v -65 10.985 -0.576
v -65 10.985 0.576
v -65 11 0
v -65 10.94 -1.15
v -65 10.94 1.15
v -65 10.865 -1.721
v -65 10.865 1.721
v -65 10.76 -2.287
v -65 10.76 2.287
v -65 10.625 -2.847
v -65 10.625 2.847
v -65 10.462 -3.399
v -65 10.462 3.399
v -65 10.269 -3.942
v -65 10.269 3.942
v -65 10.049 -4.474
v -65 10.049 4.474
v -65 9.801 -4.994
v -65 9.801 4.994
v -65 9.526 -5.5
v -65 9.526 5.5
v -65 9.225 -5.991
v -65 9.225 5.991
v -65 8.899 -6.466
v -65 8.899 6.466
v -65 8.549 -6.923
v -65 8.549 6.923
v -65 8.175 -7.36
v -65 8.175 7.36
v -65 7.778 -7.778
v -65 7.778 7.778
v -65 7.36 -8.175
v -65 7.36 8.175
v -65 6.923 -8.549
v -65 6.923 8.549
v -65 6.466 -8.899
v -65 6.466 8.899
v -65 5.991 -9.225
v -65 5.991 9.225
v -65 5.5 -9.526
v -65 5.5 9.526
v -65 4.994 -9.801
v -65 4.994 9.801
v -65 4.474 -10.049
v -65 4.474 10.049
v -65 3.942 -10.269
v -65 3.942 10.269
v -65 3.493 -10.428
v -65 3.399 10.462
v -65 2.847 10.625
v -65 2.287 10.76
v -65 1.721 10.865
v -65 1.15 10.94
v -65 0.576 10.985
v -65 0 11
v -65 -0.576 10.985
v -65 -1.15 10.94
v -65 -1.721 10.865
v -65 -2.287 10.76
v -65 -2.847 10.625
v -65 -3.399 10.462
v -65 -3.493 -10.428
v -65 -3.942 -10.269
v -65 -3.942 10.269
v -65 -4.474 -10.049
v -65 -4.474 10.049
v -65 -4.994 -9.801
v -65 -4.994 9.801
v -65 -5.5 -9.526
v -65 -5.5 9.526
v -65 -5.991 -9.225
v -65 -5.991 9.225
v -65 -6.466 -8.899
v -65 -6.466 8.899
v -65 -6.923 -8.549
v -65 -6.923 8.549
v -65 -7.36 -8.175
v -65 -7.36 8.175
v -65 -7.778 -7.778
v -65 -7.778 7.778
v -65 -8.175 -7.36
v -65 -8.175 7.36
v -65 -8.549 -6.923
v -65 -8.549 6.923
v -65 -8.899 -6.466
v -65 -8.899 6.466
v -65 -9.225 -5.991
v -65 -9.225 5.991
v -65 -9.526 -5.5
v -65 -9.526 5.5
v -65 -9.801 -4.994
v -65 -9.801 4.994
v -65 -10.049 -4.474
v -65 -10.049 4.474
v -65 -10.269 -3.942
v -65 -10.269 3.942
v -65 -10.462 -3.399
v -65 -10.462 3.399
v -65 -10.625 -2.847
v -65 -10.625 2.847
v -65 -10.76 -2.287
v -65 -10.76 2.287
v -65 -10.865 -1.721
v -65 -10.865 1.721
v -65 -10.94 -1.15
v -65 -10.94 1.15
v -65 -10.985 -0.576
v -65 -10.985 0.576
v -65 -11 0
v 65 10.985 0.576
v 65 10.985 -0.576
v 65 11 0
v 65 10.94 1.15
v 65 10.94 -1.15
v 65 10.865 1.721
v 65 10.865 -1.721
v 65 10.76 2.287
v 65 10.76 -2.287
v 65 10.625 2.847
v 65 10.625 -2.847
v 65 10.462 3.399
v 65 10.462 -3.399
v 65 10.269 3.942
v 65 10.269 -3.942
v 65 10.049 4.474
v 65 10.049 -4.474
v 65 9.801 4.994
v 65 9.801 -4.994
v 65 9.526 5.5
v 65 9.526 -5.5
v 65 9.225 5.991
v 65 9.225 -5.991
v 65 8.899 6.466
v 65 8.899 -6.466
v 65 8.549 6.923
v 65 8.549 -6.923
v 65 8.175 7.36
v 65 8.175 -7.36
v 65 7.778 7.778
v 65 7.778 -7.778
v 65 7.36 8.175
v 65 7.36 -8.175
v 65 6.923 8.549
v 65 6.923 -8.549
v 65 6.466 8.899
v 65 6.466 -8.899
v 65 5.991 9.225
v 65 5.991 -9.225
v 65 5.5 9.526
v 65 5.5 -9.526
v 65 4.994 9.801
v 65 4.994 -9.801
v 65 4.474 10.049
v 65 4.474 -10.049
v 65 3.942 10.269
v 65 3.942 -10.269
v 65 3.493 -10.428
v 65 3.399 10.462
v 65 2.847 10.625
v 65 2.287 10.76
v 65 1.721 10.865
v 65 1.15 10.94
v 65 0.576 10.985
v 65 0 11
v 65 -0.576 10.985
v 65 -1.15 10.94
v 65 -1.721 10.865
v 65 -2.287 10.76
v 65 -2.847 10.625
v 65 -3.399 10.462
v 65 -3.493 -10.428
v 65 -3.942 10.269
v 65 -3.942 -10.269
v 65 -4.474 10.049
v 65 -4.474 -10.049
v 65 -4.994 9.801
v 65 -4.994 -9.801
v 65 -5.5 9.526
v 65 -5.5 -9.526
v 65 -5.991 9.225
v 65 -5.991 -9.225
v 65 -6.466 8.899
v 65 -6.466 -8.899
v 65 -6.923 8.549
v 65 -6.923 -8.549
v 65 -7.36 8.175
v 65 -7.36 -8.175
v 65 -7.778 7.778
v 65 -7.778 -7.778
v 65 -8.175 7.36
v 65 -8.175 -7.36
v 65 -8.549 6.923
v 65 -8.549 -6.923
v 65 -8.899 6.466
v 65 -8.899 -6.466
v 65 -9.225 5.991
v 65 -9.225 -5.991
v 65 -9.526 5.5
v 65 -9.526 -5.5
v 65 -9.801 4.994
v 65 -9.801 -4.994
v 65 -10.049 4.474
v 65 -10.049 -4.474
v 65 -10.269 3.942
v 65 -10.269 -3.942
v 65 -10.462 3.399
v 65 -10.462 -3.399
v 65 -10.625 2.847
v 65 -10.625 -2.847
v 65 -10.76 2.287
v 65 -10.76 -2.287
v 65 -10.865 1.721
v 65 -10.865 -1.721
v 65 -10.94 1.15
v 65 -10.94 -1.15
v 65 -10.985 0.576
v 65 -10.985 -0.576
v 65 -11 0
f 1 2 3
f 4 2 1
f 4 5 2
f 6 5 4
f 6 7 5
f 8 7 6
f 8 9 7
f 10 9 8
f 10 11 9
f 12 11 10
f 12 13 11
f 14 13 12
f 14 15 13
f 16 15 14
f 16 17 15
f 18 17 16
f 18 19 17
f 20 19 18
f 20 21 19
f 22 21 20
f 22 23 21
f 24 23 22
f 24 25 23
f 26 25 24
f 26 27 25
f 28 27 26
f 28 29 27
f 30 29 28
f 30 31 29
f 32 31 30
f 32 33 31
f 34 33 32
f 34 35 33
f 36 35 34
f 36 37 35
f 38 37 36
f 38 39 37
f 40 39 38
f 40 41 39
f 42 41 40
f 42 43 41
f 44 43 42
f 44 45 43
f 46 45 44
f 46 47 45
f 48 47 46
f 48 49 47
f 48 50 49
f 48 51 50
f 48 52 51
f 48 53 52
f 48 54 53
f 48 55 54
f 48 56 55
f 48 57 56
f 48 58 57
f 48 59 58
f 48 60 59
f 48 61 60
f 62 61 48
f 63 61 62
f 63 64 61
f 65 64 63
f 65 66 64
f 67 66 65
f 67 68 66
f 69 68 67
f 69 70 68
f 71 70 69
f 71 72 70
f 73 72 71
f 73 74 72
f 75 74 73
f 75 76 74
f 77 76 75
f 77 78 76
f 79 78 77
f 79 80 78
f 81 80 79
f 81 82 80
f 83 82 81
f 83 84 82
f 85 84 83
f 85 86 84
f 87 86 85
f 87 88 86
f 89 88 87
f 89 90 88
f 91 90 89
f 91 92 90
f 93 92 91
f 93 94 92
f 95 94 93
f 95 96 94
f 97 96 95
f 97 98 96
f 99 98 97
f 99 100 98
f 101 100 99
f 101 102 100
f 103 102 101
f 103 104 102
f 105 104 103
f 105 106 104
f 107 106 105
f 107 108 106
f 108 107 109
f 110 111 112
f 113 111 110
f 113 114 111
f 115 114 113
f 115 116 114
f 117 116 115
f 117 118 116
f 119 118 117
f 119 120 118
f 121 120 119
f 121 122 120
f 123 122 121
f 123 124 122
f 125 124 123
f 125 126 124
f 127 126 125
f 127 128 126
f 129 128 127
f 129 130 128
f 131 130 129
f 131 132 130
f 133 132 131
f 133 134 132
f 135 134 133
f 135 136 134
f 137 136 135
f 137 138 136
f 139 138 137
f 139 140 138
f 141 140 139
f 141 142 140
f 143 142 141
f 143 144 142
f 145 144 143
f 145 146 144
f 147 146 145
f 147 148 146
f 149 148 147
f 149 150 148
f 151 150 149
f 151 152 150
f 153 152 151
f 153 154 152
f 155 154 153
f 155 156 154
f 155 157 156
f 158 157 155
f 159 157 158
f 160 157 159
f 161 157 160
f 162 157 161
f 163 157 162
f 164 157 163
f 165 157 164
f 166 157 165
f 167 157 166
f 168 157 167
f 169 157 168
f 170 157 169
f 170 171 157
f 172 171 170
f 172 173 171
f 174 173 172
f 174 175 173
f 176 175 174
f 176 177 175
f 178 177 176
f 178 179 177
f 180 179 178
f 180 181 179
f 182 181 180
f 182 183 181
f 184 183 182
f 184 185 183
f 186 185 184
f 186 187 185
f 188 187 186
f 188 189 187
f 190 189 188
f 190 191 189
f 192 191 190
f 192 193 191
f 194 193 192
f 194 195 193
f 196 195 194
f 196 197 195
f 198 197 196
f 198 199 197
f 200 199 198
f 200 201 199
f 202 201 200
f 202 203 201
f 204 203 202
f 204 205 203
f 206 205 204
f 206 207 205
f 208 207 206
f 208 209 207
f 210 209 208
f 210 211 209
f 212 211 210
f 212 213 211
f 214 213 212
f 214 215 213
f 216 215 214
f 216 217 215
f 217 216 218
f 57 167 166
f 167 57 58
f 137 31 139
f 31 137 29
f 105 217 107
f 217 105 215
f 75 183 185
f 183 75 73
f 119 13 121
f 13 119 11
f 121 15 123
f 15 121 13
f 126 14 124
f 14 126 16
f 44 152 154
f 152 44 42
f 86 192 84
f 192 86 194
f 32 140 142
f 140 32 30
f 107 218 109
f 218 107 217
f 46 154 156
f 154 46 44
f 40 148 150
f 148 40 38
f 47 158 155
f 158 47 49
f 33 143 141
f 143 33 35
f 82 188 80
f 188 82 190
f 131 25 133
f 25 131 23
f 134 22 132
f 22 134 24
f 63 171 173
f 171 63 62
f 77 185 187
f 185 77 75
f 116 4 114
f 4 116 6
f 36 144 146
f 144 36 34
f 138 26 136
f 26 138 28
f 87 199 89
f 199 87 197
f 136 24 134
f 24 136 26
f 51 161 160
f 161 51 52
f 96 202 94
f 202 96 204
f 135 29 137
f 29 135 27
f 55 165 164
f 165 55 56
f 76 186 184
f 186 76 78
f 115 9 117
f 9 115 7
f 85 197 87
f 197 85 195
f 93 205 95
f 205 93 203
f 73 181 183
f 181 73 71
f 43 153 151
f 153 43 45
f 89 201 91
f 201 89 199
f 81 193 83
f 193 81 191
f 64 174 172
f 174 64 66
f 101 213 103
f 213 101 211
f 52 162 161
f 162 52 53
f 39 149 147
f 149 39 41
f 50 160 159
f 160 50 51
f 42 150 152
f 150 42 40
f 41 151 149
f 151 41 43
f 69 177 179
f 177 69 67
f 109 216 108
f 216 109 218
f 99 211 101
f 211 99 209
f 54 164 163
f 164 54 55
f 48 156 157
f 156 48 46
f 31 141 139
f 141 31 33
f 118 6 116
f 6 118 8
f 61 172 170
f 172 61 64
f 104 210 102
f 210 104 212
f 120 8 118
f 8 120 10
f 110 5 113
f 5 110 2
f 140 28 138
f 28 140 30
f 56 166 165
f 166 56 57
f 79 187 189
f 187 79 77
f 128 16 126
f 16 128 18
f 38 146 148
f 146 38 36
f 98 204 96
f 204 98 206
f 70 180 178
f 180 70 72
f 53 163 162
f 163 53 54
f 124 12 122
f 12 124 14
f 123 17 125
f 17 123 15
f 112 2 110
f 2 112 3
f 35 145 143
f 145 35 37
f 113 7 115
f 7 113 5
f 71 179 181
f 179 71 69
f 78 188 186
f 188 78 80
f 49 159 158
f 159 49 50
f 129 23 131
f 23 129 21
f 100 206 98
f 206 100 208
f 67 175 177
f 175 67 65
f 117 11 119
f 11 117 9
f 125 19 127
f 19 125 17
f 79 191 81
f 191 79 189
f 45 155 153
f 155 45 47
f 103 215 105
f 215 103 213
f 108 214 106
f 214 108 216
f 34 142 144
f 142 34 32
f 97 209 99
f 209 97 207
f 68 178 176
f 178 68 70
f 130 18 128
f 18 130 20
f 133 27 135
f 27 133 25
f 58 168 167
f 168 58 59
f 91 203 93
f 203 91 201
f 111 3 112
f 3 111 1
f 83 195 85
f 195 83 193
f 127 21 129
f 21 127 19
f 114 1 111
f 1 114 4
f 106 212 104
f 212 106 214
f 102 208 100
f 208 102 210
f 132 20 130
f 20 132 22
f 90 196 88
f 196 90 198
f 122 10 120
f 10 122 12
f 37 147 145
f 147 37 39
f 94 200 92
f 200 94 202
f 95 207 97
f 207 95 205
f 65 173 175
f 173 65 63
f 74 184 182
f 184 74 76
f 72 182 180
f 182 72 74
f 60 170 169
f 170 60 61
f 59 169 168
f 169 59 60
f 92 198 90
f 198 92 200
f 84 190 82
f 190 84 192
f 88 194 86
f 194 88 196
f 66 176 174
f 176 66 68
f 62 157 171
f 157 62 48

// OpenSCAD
// lenkerrohr.scad — Erweiterungsrohr zum Selbstdrucken
//
// Das Gegenstueck zur Lenkererweiterung: das Rohr, das in die feste
// 22-mm-Aufnahme gesteckt wird. Bewusst als liegender Zylinder mit
// Abflachung nach unten konstruiert, damit es ohne Stuetzmaterial und mit
// satter Auflageflaeche druckt.
fn = 120;  $fn = fn;

d_rohr     = 22;    // Aussendurchmesser, passt in die 22-mm-Aufnahme
laenge     = 130;   // 120 bis 140 sind praktikabel
// Vollbauteil. Bei FDM kommt die Steifigkeit aus Perimeterwaenden und
// geometrischem Infill, nicht aus einer modellierten Rohrwand - eine innere
// Wand waere nur Material und Druckzeit ohne Gewinn. Der Slicer macht das
// besser als das Modell: 4 Perimeter, 30 % Cubic oder Gyroid.
auflage    = 7;     // Breite der Auflageflaeche in mm (6 bis 8 sind sinnvoll)
fase       = 1;     // Fase an beiden Enden

// Aus der gewuenschten Auflagebreite den noetigen Abtrag rechnen: der Kreis
// gibt bei flachem Schnitt viel Breite fuer wenig Tiefe her.
function abtrag()   = d_rohr/2 - sqrt(pow(d_rohr/2, 2) - pow(auflage/2, 2));
function tiefe()    = abtrag();

assert(d_rohr > 4, "Durchmesser zu klein");
assert(auflage > 0 && auflage < d_rohr, "Auflagebreite muss zwischen 0 und dem Durchmesser liegen");
assert(tiefe() < d_rohr/4, str("Auflage zu breit: ", auflage, " mm ergibt ", tiefe(), " mm Abtrag"));
assert(laenge >= 40, "Laenge zu kurz fuer eine Erweiterung");

module lenkerrohr()
{
    difference()
    {
        union()
        {
            // liegend, damit die Abflachung beim Drucken unten liegt
            rotate([0, 90, 0]) cylinder(d = d_rohr, h = laenge, center = true);
            if (fase > 0) for (s = [-1, 1])
                translate([s*(laenge/2 - fase), 0, 0]) rotate([0, s*90, 0])
                    cylinder(d1 = d_rohr, d2 = d_rohr - 2*fase, h = fase, center = false);
        }
        // Abflachung von unten
        translate([0, 0, -d_rohr/2 + tiefe() - 50])
            cube([laenge + 4, d_rohr + 4, 100], center = true);
    }
}

lenkerrohr();

// --- Ausgabe -------------------------------------------------------------
echo(str("Aussendurchmesser: ", d_rohr, " mm | Laenge: ", laenge, " mm"));
echo(str("Auflageflaeche: ", auflage, " mm breit, dafuer ", tiefe(), " mm Abtrag"));
echo(str("Vollmaterial im Modell: ", laenge*(pow(d_rohr/2,2)*acos(1-2*tiefe()/d_rohr) - (d_rohr/2 - tiefe())*sqrt(d_rohr*tiefe() - pow(tiefe(),2))), " mm3"));
